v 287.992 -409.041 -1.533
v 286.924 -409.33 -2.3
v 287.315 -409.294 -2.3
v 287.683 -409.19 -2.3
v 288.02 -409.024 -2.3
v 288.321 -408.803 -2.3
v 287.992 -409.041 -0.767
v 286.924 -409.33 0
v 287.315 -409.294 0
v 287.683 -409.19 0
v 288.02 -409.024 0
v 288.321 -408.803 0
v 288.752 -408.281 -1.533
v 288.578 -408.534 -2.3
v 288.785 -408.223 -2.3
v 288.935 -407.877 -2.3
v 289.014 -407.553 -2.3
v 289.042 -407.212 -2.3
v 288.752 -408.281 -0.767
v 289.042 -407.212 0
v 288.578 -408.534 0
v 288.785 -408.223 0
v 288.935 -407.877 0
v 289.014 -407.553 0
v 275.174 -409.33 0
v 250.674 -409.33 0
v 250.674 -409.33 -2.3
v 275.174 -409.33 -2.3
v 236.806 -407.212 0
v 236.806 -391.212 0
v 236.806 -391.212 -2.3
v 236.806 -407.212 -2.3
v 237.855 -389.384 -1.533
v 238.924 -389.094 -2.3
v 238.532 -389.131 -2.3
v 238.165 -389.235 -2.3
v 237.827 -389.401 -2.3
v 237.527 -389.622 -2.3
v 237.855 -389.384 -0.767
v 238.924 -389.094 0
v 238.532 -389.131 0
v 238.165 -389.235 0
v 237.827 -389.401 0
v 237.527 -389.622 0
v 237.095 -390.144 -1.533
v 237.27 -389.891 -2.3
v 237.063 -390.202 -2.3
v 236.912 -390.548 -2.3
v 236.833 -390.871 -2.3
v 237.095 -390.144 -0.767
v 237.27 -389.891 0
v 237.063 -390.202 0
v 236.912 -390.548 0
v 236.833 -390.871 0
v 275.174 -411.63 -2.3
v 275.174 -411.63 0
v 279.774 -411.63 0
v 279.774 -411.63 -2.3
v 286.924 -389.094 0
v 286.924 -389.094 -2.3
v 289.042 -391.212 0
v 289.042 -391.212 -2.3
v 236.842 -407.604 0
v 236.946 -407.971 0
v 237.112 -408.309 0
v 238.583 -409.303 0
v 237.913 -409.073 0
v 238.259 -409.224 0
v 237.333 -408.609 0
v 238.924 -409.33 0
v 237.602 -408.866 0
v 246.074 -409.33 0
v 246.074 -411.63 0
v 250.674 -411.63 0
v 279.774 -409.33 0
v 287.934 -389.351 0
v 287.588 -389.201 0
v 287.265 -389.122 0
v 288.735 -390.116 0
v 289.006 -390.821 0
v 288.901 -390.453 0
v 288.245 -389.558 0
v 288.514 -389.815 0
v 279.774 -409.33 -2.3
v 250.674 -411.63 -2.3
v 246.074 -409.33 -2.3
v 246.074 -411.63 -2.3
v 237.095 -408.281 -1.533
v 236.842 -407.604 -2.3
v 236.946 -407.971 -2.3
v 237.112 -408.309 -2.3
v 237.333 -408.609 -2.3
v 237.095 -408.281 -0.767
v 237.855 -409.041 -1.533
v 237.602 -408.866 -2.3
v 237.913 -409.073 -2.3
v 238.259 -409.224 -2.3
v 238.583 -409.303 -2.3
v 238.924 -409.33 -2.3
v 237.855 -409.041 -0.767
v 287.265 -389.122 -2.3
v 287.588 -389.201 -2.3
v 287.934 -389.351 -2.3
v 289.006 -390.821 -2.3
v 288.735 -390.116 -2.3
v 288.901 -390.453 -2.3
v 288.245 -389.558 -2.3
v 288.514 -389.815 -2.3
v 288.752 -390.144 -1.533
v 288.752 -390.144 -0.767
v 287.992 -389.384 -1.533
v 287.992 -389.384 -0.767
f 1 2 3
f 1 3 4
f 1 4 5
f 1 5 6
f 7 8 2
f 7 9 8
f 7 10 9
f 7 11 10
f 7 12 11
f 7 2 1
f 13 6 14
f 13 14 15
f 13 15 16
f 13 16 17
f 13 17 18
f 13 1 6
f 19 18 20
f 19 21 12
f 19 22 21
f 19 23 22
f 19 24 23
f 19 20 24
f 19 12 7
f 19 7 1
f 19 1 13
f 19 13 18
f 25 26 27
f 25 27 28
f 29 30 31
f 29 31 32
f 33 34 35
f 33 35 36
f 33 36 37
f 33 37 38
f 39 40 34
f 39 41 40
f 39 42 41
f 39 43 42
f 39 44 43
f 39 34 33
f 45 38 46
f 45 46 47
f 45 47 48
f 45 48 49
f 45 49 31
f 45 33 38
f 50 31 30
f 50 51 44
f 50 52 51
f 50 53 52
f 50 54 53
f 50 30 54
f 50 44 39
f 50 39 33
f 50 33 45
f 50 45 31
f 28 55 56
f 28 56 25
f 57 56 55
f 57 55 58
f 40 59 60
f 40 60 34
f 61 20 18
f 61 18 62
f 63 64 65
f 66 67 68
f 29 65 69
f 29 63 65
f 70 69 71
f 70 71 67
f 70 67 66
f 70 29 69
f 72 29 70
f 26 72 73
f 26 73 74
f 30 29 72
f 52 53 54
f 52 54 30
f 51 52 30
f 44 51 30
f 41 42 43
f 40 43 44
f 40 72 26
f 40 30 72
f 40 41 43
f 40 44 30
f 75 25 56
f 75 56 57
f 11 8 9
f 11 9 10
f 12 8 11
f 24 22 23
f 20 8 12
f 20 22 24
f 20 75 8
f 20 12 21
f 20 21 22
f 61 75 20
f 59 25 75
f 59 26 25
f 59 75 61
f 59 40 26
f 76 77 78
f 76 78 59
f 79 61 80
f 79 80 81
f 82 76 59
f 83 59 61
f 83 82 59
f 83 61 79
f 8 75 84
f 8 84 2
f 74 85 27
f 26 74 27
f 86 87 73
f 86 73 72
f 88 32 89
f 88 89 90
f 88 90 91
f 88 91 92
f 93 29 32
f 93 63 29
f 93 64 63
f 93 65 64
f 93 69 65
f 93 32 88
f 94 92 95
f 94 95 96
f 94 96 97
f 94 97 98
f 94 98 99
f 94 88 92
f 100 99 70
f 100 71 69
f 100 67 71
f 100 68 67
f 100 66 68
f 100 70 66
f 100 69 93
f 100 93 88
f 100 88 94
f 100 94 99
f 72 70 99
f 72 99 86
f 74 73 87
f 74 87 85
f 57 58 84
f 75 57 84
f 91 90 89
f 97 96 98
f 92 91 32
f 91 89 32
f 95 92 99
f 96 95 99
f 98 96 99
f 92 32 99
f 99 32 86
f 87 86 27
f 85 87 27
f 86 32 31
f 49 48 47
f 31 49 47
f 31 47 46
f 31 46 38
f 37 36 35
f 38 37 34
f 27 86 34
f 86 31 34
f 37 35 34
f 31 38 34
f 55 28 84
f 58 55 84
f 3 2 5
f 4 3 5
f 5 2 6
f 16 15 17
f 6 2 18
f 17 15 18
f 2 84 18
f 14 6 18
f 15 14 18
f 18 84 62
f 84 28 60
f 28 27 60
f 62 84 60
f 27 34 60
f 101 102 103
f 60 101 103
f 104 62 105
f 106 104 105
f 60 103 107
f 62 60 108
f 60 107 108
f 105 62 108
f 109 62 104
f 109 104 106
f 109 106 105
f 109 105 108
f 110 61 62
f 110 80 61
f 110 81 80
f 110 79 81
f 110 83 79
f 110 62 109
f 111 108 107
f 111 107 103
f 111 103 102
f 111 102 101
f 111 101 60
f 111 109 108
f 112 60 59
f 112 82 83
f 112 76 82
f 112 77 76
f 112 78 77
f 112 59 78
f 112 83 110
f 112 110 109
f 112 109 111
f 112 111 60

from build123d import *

# Parameters (mm, degrees)
BASE_FLANGE1_DEPTH = 2.3
SKETCH6_W          = 4.6
SKETCH6_H          = 2.3
TAB1_DEPTH         = 2.3


# Sheet-metal steps are written as plain solids
with BuildPart() as part:
    # Model → Base-Flange1 (new body)
    with BuildSketch(Plane.XY):
        with BuildLine():
            Line((286.92374396, -389.094251747), (238.923745329, -389.094251747))
            add(Edge.make_bspline(
                [(238.923745329, -389.094251747), (237.7557503, -389.094251747), (236.80552837, -390.044409082), (236.80552837, -391.212296452)],
                knots=[1, 1, 1, 1, 2, 2, 2, 2], degree=3))
            Line((236.80552837, -391.212296452), (236.80552837, -407.212353414))
            add(Edge.make_bspline(
                [(236.80552837, -407.212353414), (236.80552837, -408.380240783), (237.7557503, -409.330398118), (238.923745329, -409.330398118)],
                knots=[3, 3, 3, 3, 4, 4, 4, 4], degree=3))
            Line((238.923745329, -409.330398118), (286.92374396, -409.330398118))
            add(Edge.make_bspline(
                [(286.92374396, -409.330398118), (288.09163133, -409.330398118), (289.041788665, -408.380240783), (289.041788665, -407.212353414)],
                knots=[5, 5, 5, 5, 6, 6, 6, 6], degree=3))
            Line((289.041788665, -407.212353414), (289.041788665, -391.212296452))
            add(Edge.make_bspline(
                [(289.041788665, -391.212296452), (289.041788665, -390.044409082), (288.09163133, -389.094251747), (286.92374396, -389.094251747)],
                knots=[7, 7, 7, 7, 8, 8, 8, 8], degree=3))
        make_face()
    extrude(amount=-BASE_FLANGE1_DEPTH)

    # Sketch6 → Tab1 (add)
    with BuildSketch(Plane.XY):
        with Locations((248.373744645, -410.480398118)):
            Rectangle(SKETCH6_W, SKETCH6_H)
        with Locations((277.473744645, -410.480398118)):
            Rectangle(SKETCH6_W, SKETCH6_H)
    extrude(amount=-TAB1_DEPTH)


solid = part.part
